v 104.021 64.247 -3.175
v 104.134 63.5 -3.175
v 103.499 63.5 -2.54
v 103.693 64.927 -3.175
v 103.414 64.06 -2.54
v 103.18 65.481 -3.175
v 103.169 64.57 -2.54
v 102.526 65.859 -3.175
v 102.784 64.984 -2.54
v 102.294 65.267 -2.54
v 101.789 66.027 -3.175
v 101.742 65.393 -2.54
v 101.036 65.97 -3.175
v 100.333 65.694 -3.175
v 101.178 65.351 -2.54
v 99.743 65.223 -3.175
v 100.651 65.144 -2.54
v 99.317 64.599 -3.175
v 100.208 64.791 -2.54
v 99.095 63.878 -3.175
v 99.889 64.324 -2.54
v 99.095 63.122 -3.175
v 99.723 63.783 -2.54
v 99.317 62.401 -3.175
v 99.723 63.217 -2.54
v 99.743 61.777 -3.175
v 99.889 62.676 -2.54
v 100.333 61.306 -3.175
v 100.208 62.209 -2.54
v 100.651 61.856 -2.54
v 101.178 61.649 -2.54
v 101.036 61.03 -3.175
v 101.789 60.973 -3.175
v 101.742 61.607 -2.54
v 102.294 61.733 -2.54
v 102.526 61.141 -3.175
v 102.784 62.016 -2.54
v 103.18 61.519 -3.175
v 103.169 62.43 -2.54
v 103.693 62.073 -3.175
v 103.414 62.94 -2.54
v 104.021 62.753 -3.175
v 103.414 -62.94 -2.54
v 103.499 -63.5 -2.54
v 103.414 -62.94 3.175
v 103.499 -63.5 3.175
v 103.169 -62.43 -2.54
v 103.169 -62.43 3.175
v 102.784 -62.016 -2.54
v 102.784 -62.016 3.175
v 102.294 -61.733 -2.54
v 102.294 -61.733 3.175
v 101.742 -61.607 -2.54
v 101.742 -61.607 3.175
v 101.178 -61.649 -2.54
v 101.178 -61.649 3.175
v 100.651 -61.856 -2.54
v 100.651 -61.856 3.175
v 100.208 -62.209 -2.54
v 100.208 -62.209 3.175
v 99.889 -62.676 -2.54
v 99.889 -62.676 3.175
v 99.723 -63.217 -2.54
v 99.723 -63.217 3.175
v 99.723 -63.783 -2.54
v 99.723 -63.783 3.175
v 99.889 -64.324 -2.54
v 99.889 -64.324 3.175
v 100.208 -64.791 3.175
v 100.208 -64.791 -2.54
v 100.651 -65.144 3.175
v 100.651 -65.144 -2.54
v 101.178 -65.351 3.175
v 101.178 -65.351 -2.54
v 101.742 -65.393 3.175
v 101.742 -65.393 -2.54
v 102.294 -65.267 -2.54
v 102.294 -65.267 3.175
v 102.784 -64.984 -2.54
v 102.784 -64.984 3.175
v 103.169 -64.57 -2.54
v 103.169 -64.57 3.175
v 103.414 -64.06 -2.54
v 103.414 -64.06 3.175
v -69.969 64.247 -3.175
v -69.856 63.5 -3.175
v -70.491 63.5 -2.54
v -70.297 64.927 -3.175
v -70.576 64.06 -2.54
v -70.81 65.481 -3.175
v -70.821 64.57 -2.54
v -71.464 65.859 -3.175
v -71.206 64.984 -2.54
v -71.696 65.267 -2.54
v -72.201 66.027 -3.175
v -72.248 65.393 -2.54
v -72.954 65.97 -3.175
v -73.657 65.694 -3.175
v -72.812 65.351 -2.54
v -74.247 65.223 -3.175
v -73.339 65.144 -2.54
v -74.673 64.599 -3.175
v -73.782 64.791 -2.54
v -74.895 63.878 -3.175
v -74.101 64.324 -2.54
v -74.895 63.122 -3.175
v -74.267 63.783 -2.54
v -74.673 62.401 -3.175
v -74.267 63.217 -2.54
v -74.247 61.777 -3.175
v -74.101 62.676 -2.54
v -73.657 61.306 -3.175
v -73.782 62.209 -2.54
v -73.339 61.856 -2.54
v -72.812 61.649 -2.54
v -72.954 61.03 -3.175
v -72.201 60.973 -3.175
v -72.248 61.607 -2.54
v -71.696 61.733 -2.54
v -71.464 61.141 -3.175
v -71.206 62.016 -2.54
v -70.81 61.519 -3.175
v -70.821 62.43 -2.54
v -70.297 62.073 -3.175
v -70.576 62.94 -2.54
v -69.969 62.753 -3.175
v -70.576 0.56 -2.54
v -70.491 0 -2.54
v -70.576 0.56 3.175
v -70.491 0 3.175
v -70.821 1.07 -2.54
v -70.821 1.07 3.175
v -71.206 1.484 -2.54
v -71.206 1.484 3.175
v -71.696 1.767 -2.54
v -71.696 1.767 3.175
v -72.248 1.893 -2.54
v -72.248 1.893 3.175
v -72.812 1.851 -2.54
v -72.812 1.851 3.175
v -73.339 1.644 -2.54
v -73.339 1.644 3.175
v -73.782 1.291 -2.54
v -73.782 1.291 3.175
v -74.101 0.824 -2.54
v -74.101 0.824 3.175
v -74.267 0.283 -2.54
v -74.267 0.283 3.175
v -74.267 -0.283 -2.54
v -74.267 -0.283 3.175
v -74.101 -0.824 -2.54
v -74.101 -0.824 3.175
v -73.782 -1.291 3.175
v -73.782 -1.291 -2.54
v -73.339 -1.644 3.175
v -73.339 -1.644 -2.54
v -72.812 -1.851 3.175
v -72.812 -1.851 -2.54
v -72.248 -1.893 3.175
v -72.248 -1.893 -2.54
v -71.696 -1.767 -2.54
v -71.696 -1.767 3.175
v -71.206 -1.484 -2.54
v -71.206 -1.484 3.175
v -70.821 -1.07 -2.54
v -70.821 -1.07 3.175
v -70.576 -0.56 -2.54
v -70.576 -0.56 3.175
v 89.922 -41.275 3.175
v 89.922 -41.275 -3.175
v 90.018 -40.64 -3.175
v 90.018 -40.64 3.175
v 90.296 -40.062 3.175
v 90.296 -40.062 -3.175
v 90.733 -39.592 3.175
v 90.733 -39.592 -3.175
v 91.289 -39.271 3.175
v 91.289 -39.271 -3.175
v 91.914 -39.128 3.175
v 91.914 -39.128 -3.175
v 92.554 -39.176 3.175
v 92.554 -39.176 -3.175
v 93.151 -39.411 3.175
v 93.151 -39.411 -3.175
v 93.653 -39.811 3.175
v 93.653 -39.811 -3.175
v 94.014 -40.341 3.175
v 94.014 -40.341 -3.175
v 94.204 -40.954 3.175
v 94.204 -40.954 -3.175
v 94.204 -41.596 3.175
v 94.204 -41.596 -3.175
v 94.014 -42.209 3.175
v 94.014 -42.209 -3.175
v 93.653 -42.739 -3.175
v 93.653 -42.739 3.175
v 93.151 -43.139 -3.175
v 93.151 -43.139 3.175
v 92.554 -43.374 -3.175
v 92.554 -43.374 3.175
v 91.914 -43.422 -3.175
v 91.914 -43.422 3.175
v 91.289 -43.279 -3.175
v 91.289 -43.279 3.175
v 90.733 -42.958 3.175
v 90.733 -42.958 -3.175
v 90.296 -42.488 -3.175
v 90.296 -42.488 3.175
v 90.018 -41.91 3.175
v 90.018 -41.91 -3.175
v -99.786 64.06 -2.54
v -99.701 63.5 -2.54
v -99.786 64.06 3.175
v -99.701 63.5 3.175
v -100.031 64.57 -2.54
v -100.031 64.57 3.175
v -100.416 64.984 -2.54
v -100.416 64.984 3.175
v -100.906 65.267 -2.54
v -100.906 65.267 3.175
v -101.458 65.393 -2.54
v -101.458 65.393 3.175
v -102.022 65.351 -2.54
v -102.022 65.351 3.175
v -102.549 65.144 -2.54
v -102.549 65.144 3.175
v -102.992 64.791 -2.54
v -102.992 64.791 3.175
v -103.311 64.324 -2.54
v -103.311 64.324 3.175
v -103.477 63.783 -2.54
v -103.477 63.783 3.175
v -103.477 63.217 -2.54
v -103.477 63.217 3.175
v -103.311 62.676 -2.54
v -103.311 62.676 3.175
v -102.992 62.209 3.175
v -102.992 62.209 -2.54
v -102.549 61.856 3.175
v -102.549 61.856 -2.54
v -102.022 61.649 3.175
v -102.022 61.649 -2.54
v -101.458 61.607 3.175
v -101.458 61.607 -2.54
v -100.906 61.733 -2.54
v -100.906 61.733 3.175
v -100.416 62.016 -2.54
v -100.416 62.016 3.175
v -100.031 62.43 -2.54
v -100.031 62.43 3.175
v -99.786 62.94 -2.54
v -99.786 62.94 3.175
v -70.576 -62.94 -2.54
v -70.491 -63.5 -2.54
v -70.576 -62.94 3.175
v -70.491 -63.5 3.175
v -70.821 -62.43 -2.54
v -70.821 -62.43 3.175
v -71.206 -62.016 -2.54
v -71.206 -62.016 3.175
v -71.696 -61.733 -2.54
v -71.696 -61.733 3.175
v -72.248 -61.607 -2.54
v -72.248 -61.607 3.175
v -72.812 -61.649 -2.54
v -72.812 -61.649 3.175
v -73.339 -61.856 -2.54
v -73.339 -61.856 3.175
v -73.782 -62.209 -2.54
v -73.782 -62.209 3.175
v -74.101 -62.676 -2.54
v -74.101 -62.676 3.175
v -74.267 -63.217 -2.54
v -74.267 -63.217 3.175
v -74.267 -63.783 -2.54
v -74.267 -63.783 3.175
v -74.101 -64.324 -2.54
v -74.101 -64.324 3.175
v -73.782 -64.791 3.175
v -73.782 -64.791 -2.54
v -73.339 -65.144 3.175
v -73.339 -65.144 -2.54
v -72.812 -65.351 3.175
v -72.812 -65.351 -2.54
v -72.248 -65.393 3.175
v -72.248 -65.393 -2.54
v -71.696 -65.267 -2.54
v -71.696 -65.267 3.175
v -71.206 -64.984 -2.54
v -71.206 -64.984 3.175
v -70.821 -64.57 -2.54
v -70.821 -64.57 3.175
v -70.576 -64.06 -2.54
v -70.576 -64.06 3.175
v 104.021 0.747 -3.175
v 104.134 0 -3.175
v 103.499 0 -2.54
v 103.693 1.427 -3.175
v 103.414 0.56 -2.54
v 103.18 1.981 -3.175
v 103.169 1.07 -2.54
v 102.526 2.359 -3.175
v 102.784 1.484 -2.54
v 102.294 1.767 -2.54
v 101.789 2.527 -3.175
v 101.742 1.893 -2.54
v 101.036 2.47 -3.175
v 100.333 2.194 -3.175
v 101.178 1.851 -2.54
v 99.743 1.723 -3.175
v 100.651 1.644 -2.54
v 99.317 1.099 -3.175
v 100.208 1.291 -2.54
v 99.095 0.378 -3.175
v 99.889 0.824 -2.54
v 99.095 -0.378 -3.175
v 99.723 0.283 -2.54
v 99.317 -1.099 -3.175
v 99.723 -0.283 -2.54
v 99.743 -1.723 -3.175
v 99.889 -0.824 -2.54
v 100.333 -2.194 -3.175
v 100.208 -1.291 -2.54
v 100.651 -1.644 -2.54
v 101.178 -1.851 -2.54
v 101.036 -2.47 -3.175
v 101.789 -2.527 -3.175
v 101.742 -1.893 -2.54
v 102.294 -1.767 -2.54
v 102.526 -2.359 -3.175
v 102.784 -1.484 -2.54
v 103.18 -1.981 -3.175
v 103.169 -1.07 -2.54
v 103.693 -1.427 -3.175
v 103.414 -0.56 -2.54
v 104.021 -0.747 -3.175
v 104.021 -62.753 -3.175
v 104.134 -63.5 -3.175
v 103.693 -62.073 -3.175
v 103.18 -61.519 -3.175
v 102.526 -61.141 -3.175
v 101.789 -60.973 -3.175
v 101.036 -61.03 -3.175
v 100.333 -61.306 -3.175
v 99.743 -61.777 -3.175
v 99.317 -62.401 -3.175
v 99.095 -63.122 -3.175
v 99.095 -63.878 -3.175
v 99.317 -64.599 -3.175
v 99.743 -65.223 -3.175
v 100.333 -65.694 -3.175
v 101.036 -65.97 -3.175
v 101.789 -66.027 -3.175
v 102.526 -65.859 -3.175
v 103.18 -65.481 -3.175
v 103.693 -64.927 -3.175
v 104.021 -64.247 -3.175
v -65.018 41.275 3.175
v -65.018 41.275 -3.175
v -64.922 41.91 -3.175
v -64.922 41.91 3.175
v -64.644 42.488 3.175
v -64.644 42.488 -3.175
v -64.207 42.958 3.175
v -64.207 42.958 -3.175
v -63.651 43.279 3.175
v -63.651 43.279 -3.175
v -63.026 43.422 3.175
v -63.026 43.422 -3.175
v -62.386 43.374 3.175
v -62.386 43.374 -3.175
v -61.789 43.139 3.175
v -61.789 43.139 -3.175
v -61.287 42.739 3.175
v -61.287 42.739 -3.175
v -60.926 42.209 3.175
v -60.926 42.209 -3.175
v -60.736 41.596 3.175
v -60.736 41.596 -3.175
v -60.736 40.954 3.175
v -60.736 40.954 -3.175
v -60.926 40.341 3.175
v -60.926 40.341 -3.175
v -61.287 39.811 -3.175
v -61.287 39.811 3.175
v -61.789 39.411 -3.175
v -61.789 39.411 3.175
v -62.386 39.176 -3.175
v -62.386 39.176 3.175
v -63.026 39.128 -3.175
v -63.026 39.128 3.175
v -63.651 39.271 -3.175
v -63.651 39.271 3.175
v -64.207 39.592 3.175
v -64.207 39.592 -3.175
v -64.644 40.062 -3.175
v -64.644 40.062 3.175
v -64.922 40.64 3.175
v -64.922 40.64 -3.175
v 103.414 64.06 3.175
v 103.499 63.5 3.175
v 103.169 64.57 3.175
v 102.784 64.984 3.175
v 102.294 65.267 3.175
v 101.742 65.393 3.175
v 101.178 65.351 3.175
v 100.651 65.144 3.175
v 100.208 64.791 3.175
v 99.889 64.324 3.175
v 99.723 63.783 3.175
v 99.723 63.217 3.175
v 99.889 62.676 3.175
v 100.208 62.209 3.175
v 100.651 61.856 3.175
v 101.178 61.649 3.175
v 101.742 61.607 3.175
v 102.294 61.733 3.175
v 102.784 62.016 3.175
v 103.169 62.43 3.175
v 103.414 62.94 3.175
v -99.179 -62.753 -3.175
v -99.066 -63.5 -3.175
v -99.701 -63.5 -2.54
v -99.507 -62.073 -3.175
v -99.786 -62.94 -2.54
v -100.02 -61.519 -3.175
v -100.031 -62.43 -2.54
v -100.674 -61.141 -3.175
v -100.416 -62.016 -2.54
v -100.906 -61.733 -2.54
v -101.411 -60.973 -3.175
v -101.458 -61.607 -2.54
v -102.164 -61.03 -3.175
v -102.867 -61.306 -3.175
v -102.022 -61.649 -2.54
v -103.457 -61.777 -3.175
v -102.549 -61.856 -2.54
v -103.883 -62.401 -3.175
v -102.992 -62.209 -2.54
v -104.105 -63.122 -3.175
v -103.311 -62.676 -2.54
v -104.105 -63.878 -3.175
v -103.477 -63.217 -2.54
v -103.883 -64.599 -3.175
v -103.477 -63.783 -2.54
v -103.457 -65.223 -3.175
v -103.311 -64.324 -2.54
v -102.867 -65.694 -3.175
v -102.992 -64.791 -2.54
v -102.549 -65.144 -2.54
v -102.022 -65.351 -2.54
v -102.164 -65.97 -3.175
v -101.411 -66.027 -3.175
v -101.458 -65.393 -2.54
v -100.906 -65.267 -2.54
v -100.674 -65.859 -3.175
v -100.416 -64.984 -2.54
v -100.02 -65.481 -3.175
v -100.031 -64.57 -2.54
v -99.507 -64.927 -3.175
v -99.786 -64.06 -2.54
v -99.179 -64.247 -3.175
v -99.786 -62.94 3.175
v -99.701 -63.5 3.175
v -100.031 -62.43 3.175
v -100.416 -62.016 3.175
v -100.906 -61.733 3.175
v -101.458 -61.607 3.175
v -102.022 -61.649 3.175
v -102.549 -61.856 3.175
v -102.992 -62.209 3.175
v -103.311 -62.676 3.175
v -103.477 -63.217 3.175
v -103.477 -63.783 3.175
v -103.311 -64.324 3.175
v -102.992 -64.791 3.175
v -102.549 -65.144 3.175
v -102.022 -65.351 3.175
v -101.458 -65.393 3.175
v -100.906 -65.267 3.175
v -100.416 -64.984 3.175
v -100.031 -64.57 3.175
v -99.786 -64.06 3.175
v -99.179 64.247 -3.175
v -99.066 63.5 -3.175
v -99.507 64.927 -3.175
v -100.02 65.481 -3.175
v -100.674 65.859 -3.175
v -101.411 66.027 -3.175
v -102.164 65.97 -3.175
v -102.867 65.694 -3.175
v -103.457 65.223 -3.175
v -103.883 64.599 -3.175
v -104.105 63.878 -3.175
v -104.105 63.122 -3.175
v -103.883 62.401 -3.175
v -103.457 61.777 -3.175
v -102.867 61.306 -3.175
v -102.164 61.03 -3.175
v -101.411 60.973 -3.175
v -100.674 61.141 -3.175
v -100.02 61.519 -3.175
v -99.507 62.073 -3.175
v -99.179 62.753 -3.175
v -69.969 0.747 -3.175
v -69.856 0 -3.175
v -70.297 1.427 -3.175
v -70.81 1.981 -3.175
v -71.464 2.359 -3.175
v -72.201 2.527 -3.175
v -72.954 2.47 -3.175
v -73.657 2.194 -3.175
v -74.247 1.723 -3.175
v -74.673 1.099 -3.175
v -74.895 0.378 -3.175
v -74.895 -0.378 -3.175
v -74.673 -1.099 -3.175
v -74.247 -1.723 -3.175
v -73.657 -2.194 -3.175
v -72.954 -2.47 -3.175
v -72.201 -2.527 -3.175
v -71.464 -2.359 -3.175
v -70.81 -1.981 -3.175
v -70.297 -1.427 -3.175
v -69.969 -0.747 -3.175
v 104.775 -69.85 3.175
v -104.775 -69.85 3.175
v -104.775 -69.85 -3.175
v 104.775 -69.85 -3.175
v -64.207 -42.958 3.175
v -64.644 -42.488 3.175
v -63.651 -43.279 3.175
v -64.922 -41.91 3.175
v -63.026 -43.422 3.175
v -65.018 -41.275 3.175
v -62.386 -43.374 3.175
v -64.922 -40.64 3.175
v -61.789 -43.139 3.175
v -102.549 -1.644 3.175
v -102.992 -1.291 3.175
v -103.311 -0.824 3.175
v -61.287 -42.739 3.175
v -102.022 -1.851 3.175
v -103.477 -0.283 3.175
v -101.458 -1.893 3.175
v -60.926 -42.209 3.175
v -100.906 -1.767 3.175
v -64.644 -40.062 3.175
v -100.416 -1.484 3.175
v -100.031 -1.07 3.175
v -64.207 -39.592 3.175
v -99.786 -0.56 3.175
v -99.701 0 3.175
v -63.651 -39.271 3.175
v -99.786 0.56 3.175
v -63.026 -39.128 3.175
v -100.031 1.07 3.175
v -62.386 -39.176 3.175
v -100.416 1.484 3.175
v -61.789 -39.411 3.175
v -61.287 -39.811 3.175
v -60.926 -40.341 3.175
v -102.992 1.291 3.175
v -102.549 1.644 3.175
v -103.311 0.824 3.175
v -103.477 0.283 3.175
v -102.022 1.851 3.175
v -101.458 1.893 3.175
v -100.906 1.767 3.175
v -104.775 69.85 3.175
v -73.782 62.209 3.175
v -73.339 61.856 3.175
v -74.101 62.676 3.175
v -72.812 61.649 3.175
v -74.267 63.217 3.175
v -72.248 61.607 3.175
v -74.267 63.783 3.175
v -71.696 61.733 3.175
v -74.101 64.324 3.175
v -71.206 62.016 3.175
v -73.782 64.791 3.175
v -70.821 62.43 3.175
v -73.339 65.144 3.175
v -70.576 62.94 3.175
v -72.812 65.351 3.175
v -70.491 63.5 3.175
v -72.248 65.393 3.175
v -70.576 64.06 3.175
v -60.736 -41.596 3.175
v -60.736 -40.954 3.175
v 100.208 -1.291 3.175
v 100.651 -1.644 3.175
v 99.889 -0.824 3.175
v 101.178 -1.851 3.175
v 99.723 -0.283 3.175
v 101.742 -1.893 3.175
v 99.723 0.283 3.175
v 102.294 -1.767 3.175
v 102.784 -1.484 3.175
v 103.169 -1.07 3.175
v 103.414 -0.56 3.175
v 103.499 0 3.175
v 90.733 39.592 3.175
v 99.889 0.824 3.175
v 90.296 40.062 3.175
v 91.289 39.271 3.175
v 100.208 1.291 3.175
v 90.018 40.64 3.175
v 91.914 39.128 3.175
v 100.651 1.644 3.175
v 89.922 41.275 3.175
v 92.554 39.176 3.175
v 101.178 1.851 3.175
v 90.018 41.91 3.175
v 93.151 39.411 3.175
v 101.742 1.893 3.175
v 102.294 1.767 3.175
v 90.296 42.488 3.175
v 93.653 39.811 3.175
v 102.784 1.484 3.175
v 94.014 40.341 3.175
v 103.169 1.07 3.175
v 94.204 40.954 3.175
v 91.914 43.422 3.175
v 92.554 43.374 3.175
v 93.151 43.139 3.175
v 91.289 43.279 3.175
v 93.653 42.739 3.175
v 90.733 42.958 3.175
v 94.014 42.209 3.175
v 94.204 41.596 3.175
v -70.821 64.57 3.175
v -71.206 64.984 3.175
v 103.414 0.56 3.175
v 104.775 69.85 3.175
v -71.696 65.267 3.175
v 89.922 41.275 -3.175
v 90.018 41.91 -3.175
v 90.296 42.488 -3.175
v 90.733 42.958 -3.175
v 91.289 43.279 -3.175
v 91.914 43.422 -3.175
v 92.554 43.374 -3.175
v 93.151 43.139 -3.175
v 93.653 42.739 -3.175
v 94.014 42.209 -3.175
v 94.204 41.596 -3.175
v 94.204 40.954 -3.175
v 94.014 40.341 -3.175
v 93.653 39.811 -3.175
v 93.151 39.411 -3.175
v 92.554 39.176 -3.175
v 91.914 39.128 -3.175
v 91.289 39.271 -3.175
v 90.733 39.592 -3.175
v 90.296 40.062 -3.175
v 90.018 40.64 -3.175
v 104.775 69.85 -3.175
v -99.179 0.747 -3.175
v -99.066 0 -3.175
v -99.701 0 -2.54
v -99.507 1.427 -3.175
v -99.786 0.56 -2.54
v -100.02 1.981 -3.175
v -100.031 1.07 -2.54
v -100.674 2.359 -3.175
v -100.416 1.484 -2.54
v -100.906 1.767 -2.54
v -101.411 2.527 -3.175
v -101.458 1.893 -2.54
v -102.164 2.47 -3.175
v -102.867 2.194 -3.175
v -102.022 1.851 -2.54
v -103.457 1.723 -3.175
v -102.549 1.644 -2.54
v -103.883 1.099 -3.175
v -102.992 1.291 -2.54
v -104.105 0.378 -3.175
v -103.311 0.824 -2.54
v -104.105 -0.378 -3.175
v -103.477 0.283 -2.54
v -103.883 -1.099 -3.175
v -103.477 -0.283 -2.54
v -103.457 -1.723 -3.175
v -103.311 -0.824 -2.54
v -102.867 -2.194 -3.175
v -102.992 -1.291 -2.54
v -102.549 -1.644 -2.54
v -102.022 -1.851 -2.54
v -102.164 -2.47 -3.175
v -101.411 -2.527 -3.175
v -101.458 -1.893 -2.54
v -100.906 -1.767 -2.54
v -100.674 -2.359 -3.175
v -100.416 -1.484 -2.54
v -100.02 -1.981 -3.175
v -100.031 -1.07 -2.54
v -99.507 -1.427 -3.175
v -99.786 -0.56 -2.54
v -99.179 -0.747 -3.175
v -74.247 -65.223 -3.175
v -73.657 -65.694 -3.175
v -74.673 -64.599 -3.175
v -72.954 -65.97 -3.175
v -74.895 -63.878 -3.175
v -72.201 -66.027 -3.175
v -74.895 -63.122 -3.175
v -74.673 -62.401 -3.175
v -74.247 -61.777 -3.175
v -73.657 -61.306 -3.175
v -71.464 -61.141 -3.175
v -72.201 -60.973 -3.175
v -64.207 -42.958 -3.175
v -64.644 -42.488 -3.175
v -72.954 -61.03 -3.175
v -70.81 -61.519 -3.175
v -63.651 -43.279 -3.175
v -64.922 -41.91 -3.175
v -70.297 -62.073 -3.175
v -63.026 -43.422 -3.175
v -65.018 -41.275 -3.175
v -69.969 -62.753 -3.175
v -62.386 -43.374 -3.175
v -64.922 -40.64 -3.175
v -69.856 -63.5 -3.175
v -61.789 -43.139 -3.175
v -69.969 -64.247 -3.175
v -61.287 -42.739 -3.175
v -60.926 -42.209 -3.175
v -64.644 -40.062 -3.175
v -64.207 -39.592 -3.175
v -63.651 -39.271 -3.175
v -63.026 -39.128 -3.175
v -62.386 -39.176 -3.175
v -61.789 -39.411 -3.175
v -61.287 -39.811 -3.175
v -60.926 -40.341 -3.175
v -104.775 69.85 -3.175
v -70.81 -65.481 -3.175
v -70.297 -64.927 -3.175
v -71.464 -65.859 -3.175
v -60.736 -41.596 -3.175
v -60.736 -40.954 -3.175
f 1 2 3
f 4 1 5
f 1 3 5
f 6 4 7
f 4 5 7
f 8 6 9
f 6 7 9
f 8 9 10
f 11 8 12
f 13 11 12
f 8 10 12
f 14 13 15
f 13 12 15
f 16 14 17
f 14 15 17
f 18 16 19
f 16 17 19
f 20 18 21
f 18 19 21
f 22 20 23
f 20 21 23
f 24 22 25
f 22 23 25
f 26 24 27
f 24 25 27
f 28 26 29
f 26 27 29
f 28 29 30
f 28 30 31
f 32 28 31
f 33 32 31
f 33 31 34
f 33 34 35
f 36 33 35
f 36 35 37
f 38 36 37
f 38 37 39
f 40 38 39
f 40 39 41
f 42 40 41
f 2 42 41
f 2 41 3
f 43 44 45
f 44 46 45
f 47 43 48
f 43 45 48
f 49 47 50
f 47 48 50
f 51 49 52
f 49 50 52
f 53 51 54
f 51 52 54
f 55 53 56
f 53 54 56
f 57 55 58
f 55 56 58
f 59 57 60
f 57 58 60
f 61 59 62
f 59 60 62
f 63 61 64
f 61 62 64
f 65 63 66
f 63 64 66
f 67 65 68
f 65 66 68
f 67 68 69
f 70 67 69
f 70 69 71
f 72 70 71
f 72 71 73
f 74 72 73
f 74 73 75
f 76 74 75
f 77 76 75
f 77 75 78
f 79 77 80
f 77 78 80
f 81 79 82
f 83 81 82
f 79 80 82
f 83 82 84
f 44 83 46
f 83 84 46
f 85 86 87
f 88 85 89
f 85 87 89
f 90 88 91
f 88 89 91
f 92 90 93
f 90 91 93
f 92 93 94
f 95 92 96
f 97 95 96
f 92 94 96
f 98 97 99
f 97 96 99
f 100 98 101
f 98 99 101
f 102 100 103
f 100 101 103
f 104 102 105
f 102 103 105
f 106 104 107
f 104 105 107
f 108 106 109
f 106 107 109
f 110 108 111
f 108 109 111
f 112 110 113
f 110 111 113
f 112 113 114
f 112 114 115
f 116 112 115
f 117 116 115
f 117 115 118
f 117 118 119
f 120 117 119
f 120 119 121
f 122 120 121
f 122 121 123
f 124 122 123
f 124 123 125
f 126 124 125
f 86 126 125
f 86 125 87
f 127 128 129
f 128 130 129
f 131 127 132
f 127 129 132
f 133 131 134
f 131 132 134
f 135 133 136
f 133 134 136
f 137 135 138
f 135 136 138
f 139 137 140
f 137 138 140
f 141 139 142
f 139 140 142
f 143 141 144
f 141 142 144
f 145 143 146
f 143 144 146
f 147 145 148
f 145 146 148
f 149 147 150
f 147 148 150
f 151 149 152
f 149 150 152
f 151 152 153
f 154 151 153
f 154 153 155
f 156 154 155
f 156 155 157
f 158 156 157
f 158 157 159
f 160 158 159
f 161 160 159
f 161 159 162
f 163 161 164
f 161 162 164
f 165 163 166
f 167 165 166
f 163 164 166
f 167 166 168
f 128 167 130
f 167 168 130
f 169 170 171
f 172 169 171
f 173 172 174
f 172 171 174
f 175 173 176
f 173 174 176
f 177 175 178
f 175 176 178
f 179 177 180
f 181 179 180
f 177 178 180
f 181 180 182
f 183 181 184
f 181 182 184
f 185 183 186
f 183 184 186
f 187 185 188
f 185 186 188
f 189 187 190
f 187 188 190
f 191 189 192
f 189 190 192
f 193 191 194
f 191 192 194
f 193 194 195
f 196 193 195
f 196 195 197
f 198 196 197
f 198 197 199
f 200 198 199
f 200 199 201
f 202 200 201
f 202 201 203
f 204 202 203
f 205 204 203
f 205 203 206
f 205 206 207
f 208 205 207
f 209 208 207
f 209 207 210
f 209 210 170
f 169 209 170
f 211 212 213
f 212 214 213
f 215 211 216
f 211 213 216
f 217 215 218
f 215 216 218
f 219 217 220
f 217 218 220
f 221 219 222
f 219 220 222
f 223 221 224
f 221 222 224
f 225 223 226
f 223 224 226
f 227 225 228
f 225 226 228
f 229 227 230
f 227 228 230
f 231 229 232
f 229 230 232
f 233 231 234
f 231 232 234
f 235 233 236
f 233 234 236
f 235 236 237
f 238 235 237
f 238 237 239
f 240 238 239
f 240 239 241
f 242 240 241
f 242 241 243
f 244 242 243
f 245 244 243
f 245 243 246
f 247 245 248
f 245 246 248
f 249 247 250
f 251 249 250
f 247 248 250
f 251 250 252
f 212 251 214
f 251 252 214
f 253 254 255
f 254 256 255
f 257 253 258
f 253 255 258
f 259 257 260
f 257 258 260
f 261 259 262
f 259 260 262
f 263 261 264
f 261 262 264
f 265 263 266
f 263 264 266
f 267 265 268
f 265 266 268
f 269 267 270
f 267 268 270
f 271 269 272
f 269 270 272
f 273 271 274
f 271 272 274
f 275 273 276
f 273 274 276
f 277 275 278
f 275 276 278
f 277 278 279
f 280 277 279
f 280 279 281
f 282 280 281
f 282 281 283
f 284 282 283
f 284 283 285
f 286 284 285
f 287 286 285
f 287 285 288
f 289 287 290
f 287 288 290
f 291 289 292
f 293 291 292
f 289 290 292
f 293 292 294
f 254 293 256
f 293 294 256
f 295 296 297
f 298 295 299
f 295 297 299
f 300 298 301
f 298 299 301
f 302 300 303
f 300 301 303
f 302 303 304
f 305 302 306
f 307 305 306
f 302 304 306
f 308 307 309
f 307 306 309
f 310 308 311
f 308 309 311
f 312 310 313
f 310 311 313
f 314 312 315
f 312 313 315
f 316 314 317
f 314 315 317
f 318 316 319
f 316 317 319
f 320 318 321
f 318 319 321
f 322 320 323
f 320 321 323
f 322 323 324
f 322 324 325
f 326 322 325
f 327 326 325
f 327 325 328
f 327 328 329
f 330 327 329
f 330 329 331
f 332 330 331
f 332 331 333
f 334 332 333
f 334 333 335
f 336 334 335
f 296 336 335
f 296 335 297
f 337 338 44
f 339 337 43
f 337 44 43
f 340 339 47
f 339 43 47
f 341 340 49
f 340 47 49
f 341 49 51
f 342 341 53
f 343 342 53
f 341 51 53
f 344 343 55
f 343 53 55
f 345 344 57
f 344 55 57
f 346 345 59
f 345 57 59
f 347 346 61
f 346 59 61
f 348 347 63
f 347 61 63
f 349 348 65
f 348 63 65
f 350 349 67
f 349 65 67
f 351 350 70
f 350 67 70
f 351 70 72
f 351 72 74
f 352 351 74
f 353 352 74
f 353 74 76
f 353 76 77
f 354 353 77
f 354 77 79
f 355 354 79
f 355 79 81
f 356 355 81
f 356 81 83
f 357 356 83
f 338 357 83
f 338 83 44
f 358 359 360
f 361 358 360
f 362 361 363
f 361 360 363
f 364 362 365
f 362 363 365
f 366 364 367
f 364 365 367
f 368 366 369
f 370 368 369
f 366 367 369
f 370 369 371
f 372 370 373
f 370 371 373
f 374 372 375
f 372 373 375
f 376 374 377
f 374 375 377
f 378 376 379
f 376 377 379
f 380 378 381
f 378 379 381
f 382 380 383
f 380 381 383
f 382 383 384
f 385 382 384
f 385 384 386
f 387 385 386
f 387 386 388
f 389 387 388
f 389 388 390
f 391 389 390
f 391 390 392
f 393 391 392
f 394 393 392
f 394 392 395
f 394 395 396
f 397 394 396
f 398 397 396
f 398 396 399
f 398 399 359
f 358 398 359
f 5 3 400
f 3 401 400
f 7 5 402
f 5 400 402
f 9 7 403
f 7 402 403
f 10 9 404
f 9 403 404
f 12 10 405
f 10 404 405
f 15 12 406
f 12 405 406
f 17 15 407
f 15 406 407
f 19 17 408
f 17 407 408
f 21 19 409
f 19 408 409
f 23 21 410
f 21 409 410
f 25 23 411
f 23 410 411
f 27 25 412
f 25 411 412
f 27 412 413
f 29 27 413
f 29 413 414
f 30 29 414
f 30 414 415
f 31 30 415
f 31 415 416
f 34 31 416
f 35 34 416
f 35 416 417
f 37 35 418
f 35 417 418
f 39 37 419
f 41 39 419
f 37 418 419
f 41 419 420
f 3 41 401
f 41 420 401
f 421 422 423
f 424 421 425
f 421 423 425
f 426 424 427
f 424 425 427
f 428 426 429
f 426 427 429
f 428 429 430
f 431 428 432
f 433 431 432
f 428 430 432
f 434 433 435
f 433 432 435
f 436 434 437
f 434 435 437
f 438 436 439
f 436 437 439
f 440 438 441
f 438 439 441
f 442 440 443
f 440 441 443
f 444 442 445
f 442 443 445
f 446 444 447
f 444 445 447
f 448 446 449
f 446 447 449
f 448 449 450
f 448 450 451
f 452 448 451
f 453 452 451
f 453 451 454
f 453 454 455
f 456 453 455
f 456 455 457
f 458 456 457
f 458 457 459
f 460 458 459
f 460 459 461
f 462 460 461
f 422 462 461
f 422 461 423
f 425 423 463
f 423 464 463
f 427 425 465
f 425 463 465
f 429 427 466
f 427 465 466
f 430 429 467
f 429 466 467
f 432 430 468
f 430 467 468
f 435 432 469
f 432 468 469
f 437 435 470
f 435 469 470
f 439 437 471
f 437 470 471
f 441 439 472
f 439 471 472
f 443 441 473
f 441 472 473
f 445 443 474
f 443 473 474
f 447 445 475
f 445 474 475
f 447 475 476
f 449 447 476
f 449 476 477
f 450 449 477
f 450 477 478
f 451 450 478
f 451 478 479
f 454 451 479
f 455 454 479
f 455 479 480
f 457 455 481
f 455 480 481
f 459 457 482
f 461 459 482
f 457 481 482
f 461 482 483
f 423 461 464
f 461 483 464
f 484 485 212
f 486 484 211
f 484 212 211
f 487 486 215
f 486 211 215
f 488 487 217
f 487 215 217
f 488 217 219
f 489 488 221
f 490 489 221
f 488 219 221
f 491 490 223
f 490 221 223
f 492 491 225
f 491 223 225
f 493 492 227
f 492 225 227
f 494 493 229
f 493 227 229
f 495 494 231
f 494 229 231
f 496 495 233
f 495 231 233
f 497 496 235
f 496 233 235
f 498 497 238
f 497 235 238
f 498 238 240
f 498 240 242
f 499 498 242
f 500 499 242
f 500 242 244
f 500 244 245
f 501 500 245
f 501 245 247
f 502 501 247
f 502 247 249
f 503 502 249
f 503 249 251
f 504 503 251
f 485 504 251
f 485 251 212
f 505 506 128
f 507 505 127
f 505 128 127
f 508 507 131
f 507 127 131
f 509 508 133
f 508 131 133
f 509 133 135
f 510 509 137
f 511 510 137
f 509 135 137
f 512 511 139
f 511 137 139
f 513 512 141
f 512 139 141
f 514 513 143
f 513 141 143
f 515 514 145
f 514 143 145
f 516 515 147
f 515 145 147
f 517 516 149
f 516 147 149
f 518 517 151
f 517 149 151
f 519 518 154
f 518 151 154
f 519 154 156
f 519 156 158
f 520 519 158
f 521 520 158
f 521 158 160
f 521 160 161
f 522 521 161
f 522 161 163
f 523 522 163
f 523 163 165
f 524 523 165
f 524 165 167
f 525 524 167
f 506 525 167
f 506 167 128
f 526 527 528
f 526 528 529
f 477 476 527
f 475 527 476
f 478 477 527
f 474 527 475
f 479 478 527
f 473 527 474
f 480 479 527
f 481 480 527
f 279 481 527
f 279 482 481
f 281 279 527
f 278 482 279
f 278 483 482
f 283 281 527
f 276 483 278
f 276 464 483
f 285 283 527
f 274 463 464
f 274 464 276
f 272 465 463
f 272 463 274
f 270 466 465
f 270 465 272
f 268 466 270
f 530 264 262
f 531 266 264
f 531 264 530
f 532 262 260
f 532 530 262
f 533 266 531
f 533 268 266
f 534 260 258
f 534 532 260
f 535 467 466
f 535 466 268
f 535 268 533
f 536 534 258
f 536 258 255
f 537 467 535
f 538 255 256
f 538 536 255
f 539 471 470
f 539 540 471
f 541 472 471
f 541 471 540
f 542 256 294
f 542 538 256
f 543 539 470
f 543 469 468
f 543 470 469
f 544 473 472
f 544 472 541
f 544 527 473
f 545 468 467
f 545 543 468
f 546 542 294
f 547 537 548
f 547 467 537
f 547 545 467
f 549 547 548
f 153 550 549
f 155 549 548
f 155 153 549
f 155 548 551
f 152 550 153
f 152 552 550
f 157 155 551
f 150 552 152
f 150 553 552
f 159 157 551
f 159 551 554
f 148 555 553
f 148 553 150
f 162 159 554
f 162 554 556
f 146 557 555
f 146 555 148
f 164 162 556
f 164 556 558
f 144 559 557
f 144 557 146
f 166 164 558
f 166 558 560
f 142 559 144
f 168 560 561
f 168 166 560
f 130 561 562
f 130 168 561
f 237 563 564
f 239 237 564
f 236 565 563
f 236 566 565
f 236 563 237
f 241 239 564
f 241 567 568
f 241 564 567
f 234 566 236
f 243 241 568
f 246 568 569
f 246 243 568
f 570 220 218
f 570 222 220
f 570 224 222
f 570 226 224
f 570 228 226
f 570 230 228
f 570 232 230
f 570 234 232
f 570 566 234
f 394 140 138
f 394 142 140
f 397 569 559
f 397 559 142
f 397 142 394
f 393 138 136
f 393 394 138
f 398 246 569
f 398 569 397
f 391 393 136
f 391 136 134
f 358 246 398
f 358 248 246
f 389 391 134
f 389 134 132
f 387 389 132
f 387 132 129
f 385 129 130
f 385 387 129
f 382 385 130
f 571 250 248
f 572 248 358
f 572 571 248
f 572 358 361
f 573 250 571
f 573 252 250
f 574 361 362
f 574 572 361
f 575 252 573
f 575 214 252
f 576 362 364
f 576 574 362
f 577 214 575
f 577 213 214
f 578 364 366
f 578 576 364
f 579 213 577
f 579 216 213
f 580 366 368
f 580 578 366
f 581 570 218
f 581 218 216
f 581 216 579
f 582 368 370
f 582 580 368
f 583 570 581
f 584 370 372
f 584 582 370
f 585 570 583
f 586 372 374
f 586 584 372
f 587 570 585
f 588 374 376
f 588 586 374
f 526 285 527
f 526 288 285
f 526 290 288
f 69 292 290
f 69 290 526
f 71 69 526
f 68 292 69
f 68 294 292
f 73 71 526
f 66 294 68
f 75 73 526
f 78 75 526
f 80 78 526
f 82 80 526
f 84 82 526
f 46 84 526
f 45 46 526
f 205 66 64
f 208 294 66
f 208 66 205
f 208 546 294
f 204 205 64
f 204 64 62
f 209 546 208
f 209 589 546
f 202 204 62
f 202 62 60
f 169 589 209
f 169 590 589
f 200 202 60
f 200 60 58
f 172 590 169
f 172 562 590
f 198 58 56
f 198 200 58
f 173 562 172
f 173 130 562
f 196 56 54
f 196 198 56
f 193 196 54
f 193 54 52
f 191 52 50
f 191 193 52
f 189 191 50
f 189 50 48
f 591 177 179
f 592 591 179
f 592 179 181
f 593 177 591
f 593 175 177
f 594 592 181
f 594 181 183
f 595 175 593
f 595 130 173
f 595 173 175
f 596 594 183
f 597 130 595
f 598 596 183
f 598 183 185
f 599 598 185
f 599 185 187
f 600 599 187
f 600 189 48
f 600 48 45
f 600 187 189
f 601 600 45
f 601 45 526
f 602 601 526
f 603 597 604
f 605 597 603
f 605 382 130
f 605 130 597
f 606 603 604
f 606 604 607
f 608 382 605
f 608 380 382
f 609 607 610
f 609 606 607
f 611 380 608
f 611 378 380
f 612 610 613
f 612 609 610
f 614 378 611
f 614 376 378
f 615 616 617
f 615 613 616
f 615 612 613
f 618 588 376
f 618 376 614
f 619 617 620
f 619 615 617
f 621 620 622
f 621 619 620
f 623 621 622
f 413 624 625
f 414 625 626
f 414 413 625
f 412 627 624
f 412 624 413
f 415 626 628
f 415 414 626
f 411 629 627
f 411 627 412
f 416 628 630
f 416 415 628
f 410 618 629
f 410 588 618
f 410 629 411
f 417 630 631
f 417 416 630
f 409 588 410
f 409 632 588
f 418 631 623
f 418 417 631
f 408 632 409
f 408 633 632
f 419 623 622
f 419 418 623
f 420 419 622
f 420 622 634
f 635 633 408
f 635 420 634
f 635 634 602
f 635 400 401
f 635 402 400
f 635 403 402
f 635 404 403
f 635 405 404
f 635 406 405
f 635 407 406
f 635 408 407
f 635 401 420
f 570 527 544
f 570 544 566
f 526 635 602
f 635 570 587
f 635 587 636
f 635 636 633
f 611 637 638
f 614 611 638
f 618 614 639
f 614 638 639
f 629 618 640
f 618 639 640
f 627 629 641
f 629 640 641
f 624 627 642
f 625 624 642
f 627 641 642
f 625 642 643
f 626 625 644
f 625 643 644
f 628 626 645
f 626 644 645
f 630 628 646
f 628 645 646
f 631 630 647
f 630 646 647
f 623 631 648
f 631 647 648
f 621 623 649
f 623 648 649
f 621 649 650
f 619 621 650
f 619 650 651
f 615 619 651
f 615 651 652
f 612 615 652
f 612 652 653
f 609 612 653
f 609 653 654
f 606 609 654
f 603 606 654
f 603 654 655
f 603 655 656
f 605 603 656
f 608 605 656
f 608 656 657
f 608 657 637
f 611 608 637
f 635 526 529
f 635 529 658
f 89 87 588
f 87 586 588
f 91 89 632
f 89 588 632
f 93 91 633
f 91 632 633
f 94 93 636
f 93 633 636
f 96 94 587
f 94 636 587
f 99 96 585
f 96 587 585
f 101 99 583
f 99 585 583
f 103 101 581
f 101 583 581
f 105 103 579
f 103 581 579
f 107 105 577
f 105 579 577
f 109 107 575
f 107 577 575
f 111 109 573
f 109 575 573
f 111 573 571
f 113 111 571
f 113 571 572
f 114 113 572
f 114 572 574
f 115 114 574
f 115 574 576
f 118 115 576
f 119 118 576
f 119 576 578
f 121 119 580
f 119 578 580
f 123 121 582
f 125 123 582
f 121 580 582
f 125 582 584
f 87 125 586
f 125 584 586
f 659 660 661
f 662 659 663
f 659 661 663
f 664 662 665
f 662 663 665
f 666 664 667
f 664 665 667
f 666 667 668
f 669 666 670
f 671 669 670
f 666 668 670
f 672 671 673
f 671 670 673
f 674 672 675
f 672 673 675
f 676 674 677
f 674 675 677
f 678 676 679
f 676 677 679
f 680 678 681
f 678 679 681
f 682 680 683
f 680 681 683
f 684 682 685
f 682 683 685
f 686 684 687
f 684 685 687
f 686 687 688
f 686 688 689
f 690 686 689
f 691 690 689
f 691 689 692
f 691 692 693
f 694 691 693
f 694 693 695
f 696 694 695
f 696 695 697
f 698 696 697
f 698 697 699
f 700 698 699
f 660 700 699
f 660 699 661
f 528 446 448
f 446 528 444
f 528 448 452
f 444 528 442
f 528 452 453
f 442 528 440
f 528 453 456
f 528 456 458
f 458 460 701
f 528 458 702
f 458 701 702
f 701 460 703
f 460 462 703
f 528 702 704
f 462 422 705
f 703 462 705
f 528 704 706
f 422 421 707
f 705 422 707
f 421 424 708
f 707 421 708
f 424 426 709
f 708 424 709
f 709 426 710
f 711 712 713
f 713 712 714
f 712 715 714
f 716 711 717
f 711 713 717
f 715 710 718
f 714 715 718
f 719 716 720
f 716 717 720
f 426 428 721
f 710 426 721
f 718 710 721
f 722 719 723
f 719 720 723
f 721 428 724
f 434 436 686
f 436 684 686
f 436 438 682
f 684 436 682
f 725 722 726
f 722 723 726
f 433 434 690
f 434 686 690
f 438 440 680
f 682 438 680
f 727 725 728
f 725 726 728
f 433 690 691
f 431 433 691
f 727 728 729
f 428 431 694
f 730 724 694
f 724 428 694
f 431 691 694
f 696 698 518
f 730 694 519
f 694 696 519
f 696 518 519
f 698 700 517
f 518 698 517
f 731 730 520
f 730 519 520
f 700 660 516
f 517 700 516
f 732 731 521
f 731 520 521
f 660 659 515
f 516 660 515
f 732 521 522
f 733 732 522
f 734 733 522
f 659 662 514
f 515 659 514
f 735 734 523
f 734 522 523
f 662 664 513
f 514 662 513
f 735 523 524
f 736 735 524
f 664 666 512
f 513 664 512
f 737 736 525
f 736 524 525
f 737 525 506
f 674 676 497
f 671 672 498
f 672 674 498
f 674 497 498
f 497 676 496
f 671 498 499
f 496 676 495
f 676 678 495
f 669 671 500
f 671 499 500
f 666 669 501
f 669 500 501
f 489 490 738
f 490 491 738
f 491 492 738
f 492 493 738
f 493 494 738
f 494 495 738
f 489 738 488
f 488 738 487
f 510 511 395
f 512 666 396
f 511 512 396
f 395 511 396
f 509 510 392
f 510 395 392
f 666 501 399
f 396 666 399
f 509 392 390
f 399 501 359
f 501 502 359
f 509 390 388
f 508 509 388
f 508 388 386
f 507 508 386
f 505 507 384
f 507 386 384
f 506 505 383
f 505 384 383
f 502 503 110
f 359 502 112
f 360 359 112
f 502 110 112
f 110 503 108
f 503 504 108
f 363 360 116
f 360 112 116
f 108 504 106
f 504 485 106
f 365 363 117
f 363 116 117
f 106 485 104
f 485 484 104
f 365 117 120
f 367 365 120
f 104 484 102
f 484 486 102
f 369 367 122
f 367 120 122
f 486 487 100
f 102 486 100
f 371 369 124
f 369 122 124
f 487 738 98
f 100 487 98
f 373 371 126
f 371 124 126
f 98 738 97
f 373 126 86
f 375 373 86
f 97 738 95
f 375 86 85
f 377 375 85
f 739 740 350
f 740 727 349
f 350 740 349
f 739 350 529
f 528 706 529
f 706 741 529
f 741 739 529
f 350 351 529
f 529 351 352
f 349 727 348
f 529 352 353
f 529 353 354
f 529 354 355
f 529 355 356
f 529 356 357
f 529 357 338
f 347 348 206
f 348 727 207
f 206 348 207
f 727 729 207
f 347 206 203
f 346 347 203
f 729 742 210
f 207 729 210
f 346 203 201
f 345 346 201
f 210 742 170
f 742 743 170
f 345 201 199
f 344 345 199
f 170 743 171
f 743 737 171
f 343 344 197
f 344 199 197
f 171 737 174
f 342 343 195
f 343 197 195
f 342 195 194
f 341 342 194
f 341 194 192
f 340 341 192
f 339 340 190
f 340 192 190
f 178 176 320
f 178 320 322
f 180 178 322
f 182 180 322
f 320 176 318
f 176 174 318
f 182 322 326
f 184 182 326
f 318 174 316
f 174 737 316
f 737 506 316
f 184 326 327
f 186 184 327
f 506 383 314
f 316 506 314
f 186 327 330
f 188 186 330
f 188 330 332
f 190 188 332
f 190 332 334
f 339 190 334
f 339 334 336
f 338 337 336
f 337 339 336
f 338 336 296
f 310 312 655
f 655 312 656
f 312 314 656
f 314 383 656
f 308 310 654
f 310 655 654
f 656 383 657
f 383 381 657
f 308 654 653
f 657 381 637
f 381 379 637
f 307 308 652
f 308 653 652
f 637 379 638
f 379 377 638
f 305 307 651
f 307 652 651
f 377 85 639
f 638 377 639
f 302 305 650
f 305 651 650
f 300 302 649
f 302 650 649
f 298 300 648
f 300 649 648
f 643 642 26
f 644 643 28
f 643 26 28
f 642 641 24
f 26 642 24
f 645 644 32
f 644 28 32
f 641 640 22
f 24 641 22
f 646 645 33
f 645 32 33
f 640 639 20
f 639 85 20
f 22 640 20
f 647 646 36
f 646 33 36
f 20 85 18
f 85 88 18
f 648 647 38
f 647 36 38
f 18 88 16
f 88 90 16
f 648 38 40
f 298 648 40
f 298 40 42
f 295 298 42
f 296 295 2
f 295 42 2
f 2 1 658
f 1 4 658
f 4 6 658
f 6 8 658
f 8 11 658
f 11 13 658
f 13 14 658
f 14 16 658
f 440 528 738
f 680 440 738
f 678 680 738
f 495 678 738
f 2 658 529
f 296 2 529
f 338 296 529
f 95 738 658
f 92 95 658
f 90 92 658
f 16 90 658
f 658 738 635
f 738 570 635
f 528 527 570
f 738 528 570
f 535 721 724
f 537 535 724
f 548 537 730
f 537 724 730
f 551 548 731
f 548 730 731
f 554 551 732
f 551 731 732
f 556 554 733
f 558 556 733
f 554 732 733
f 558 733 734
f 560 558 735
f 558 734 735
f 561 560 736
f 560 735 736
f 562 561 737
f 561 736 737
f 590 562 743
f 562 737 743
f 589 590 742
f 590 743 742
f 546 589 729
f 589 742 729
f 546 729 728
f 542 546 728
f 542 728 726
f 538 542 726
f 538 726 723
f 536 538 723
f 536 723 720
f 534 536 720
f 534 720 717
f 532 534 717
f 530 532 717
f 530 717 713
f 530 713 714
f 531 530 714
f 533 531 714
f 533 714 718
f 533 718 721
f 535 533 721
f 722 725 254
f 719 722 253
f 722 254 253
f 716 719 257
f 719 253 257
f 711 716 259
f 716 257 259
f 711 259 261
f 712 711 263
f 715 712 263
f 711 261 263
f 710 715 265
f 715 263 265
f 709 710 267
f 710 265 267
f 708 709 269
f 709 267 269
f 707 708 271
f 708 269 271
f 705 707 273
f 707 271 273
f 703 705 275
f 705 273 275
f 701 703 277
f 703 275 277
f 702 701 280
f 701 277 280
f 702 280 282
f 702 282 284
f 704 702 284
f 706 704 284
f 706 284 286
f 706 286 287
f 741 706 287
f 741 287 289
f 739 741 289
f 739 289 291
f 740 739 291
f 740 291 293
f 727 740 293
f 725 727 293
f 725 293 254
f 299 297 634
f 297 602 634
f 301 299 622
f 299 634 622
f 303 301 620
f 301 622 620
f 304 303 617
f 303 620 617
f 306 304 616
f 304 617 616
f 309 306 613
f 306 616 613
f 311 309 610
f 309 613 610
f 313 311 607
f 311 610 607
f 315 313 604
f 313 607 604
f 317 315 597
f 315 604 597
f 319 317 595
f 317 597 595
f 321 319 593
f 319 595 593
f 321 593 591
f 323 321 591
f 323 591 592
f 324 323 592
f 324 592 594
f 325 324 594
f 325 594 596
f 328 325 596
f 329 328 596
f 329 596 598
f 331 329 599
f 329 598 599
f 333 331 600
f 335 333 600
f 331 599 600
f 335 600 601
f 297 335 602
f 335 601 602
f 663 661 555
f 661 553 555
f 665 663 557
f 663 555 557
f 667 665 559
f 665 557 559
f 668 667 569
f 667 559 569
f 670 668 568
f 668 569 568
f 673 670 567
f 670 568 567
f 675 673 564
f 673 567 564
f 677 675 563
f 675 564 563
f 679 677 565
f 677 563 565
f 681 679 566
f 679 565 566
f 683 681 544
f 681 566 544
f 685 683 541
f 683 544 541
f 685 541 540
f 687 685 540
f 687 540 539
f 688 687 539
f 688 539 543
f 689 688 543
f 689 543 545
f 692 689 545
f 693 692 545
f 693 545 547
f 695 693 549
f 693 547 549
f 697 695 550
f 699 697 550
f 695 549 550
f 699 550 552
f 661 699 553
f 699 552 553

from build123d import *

# Parameters (mm, degrees)
SKETCH1_W                       = 209.55
SKETCH1_H                       = 139.7
BOSS_EXTRUDE1_DEPTH             = 3.175
F_6_CLEARANCE_HOLE1_D           = 4.3053
F_6_CLEARANCE_HOLE1_DEPTH       = 9.652
F_6_CLEARANCE_HOLE1_TIP         = 1.293442612
F_6_CLEARANCE_HOLE2_D           = 3.7973
F_6_CLEARANCE_HOLE2_CSINK_D     = 5.0673
F_6_CLEARANCE_HOLE2_CSINK_ANGLE = 90


with BuildPart() as part:
    # Sketch1 → Boss-Extrude1 (new body, symmetric)
    with BuildSketch(Plane.XY):
        Rectangle(SKETCH1_W, SKETCH1_H)
    extrude(amount=BOSS_EXTRUDE1_DEPTH, both=True)

    # #6 Clearance Hole1
    with Locations(Plane.XY.offset(3.175)):
        with Locations((-62.865, 41.275), (92.075, 41.275), (92.075, -41.275), (-62.865, -41.275)):
            Hole(F_6_CLEARANCE_HOLE1_D / 2, depth=F_6_CLEARANCE_HOLE1_DEPTH)
            with Locations((0, 0, -(F_6_CLEARANCE_HOLE1_DEPTH + F_6_CLEARANCE_HOLE1_TIP / 2))):  # 118° drill point
                Cone(0, F_6_CLEARANCE_HOLE1_D / 2, F_6_CLEARANCE_HOLE1_TIP, mode=Mode.SUBTRACT)

    # #6 Clearance Hole2 (through all)
    with Locations(Plane(origin=(0, 0, -3.175), x_dir=(-1, 0, 0), z_dir=(0, 0, -1))):
        with Locations((-101.6, 63.5), (-101.6, 0), (-101.6, -63.5), (72.39, 63.5), (72.39, 0), (72.39, -63.5), (101.6, -63.5), (101.6, 0), (101.6, 63.5)):
            CounterSinkHole(F_6_CLEARANCE_HOLE2_D / 2, F_6_CLEARANCE_HOLE2_CSINK_D / 2, counter_sink_angle=F_6_CLEARANCE_HOLE2_CSINK_ANGLE)


solid = part.part
